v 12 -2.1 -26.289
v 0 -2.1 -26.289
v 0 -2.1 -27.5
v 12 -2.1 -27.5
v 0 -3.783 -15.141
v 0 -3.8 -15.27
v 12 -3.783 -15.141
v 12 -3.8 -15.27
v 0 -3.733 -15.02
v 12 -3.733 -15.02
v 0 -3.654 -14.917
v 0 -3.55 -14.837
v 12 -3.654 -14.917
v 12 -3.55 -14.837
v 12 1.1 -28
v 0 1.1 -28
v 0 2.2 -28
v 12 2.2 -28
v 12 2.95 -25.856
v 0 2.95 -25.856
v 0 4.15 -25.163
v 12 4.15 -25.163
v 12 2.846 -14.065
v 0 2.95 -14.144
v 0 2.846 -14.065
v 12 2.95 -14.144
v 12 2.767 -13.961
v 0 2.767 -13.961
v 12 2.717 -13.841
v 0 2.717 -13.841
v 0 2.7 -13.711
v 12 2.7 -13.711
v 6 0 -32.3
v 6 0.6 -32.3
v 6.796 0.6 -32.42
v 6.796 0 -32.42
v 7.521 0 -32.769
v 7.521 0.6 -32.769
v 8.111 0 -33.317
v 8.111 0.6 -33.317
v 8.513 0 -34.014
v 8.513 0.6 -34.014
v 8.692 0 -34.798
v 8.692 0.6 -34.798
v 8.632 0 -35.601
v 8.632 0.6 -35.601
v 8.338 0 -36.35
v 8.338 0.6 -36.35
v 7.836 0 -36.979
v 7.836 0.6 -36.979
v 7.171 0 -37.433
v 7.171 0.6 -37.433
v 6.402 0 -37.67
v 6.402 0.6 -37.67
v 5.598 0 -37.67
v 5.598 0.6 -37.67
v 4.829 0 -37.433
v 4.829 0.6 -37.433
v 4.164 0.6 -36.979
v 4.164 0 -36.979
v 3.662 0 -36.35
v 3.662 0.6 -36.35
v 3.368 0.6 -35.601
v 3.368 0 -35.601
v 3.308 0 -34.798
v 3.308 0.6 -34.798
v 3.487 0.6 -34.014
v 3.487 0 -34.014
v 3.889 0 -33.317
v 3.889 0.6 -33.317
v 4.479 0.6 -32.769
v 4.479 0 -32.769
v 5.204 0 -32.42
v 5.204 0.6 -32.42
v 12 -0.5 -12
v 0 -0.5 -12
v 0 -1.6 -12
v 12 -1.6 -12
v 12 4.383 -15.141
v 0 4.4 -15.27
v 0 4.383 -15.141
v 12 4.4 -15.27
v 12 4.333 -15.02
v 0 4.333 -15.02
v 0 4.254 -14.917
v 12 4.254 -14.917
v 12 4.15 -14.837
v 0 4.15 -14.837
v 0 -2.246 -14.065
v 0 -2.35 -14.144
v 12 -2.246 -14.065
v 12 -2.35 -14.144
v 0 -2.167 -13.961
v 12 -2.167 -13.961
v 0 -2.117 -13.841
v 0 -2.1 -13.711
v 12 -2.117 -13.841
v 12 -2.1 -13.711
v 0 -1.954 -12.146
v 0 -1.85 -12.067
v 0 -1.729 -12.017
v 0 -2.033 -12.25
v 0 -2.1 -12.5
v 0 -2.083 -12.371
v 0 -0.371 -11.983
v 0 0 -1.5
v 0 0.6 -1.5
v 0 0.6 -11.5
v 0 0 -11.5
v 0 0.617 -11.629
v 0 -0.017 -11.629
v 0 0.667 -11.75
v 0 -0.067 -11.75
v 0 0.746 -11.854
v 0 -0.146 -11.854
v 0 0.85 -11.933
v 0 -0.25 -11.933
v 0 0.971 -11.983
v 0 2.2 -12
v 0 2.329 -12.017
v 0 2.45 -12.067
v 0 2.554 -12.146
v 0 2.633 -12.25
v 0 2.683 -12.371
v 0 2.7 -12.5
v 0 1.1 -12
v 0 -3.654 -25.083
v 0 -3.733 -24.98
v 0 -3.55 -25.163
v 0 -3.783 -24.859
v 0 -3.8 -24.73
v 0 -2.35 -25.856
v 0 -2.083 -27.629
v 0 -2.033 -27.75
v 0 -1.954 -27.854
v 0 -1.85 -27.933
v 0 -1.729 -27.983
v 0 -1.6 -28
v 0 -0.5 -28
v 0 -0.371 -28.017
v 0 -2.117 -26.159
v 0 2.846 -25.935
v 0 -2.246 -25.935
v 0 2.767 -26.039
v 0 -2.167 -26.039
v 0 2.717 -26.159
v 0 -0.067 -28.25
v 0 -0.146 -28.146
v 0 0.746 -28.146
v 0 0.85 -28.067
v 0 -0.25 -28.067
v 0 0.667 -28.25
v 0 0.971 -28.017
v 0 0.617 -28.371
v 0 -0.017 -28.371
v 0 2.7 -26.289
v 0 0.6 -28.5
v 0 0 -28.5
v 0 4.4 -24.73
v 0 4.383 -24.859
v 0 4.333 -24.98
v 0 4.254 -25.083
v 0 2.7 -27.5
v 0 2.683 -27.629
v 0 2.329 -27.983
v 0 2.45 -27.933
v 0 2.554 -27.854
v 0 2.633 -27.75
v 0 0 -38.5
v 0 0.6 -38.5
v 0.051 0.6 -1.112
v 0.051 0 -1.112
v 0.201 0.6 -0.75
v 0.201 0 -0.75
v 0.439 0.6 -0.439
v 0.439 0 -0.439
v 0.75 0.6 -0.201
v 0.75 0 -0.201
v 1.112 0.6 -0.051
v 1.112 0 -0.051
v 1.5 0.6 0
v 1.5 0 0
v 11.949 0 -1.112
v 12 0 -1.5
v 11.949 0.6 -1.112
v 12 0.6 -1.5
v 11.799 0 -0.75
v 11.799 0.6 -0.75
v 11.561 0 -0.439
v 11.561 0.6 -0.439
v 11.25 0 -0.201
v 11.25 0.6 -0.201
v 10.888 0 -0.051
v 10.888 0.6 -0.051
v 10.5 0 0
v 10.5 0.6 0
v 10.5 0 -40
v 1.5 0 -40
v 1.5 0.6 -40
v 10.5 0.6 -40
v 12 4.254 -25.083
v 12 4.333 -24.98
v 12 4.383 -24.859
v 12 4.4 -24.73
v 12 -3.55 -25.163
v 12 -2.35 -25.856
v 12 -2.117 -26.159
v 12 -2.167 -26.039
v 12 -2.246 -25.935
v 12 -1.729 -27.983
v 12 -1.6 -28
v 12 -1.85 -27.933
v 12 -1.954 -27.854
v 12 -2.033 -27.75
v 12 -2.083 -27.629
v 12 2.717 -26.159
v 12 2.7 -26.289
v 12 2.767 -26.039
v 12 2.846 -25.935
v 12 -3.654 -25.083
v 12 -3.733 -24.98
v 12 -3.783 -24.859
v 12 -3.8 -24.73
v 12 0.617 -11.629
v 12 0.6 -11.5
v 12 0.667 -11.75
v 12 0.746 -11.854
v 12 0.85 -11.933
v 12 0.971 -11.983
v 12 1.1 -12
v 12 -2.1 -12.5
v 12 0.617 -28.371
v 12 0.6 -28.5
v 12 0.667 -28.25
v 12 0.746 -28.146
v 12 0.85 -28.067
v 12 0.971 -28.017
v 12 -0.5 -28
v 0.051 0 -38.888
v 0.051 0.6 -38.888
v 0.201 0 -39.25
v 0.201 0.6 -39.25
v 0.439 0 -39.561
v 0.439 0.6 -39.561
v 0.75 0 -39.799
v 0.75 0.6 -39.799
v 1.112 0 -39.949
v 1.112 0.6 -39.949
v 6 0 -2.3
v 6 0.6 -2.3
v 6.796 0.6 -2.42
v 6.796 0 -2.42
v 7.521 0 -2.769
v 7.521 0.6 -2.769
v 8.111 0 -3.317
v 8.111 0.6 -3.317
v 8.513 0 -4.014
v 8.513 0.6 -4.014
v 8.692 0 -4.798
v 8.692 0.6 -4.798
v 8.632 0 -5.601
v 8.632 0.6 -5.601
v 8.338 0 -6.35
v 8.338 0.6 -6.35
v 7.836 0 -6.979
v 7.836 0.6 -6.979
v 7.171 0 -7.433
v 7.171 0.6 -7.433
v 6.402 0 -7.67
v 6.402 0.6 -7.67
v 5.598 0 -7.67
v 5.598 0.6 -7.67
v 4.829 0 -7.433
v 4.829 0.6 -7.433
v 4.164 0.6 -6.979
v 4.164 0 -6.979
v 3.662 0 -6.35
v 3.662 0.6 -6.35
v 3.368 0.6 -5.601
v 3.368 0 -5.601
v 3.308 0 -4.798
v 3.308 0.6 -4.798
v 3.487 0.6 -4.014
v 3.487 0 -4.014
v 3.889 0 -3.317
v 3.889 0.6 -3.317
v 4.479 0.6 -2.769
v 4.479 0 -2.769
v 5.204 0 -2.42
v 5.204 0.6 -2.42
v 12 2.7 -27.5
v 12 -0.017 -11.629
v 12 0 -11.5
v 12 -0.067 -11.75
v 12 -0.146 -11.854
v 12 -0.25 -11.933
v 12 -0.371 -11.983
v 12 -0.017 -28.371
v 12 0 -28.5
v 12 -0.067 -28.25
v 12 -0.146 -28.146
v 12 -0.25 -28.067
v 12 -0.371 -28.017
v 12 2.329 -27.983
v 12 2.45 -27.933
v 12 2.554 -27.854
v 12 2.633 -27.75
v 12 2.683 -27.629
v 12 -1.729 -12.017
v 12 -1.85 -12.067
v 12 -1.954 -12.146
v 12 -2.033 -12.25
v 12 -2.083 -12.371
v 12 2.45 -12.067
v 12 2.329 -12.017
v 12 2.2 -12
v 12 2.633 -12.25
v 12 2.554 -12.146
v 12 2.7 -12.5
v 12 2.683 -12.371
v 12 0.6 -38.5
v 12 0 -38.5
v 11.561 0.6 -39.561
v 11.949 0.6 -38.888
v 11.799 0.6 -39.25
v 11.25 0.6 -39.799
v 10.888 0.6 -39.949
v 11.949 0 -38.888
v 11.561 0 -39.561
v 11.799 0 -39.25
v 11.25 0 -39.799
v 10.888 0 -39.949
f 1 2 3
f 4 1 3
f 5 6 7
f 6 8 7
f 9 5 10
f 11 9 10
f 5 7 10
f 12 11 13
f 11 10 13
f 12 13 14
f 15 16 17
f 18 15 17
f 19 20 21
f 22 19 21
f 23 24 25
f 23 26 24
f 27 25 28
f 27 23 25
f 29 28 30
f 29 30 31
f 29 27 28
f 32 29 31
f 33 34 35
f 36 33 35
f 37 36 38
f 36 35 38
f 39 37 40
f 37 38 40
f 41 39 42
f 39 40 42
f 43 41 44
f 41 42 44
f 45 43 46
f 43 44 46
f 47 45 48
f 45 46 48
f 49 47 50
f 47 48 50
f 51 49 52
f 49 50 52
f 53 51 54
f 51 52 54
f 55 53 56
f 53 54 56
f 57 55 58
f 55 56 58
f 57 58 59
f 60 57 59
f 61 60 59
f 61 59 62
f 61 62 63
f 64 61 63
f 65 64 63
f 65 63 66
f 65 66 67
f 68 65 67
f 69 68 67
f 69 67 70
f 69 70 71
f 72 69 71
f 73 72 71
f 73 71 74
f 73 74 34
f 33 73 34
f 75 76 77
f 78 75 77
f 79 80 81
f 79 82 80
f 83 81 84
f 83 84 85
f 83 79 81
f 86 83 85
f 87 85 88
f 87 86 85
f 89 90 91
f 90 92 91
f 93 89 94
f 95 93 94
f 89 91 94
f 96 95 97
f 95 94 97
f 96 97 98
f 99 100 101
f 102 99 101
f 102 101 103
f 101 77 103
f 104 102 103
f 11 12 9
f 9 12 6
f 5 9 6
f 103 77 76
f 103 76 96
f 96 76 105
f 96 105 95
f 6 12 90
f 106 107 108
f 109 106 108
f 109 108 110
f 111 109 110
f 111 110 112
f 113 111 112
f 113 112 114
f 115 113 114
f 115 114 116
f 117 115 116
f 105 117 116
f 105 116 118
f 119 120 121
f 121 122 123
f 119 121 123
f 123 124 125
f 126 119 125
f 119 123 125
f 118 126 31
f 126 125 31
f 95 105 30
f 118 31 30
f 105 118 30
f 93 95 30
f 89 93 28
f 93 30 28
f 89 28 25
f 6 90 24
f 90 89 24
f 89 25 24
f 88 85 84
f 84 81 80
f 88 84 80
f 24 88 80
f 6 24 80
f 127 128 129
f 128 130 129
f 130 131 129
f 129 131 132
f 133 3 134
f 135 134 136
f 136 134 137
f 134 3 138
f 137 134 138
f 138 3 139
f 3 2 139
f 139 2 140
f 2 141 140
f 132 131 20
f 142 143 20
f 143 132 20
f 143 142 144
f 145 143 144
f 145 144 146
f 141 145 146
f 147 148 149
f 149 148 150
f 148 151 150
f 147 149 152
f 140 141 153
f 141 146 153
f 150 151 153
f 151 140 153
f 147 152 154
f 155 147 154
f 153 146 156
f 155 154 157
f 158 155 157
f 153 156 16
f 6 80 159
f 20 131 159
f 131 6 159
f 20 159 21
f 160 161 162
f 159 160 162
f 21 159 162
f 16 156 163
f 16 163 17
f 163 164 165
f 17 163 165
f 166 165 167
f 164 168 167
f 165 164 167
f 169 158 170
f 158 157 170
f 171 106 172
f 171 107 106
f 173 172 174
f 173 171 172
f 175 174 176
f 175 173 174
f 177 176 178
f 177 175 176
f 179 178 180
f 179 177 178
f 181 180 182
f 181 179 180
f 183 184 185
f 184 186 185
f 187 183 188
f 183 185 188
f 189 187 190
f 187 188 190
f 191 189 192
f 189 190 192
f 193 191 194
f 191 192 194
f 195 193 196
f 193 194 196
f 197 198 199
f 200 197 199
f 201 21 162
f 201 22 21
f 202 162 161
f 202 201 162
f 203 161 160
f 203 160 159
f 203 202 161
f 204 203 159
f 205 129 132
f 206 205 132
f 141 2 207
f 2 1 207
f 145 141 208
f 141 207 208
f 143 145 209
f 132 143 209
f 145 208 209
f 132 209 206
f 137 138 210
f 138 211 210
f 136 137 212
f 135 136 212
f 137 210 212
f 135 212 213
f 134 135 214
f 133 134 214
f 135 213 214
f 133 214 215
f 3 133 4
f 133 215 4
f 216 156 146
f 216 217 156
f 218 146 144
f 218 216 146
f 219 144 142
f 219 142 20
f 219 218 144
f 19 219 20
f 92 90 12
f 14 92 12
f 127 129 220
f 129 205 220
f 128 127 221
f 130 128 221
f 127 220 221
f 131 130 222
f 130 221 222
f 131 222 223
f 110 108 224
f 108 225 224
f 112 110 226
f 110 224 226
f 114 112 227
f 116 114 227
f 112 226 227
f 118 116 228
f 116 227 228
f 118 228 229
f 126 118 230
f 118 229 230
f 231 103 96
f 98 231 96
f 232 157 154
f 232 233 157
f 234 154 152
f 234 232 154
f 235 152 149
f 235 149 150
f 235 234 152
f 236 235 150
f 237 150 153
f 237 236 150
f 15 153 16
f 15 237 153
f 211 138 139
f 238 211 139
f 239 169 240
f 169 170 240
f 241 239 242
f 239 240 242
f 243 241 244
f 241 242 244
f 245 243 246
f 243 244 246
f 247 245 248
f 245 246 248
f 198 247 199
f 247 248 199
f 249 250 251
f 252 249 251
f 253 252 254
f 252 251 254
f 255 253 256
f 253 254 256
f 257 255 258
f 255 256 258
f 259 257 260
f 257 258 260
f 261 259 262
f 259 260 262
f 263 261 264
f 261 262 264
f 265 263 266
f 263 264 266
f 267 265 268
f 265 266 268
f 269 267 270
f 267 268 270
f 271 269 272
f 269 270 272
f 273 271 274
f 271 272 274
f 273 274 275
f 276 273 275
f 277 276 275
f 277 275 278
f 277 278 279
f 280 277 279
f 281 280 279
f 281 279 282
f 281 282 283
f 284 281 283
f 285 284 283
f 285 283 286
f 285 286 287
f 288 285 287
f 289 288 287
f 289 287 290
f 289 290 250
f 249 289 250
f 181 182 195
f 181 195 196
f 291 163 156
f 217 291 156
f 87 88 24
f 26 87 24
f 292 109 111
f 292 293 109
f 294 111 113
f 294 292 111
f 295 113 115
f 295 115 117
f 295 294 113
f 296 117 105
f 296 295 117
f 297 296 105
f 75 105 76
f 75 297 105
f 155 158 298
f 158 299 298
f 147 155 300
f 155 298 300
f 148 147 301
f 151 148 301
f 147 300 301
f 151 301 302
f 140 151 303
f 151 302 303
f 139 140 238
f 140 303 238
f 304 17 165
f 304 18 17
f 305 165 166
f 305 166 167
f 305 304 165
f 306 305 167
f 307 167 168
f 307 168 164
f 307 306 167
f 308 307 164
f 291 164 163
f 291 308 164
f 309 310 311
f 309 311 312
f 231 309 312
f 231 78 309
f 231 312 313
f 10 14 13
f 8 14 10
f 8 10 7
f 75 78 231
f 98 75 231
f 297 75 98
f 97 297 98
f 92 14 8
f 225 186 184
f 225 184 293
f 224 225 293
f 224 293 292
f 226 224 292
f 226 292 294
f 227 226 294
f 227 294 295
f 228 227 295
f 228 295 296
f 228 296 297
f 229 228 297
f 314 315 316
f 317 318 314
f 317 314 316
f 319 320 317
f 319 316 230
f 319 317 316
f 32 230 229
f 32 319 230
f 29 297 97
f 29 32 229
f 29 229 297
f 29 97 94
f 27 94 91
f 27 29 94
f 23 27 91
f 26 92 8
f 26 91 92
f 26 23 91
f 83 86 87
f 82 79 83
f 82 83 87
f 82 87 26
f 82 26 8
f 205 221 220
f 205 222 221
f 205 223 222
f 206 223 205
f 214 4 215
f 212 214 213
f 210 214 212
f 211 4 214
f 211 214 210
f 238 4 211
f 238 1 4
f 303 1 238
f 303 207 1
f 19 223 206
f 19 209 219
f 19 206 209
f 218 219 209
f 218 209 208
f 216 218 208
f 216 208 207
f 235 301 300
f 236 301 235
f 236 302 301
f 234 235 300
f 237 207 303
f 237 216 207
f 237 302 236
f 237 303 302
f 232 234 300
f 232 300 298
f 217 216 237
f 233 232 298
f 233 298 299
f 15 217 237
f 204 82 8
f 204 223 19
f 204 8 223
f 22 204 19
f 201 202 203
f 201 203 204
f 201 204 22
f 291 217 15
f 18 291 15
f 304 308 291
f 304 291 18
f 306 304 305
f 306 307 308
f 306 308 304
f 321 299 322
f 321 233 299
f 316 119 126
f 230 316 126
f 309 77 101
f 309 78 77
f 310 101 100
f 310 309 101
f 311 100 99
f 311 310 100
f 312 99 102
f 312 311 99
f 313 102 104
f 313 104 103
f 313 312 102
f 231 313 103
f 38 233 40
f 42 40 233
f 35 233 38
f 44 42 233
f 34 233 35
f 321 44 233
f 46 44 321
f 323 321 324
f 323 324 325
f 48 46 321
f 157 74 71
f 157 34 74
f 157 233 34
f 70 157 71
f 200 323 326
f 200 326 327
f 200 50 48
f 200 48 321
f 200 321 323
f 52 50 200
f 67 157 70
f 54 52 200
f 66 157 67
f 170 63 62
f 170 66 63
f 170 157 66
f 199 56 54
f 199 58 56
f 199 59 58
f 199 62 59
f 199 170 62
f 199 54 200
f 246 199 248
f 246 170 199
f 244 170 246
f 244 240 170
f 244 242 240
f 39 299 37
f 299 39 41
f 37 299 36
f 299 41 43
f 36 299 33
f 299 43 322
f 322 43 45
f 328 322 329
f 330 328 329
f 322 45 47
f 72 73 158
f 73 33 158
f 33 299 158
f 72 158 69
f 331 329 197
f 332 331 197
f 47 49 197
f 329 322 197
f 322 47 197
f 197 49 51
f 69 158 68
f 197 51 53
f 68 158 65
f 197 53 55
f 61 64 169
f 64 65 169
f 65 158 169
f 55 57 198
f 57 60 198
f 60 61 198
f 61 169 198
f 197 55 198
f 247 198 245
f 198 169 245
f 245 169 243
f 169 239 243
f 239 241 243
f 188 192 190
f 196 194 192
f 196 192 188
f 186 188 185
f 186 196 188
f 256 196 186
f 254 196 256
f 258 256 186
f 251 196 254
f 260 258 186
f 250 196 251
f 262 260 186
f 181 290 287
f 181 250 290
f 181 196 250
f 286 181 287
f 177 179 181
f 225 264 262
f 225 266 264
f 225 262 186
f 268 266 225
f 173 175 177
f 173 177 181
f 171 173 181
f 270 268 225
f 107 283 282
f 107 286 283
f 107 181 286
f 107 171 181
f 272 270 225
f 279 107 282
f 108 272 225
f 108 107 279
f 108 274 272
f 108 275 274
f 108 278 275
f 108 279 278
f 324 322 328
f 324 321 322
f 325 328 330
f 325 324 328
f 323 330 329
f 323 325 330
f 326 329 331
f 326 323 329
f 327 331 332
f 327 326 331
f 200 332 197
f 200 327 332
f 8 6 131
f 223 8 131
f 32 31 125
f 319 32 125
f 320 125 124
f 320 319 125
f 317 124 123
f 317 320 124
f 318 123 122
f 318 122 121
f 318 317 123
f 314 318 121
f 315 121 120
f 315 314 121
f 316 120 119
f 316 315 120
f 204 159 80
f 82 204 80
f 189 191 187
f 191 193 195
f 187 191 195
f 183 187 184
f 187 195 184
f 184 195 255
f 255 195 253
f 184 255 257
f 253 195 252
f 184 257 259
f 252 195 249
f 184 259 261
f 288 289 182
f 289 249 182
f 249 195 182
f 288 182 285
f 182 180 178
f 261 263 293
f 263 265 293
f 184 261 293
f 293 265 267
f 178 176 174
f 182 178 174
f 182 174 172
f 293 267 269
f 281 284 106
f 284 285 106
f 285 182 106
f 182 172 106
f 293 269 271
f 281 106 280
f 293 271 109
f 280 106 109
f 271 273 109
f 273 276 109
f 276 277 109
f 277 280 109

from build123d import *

# Parameters (mm, degrees)
IZIM1_W                     = 40
IZIM1_H                     = 0.6
Y_KSEKLIK_EKSTR_ZYON1_DEPTH = 12
IZIM2_R                     = 2.7
KES_EKSTR_ZYON1_DEPTH       = 42.992380261
RADYUS1_R                   = 1.5
RADYUS2_R                   = 0.5


with BuildPart() as part:
    # Çizim1 → Yükseklik-Ekstrüzyon1 (new body)
    with BuildSketch(Plane(origin=(0, 0, 0), x_dir=(0, 0, -1), z_dir=(1, 0, 0))):
        Polygon((28, 0), (12, 0), (12, -2.1), (14, -2.1), (14.981495458, -3.8), (25.018504542, -3.8), (26, -2.1), (28, -2.1), align=None)
        Polygon((12, 2.7), (12, 0.6), (28, 0.6), (28, 2.7), (26, 2.7), (25.018504542, 4.4), (14.981495458, 4.4), (14, 2.7), align=None)
        with Locations((20, 0.3)):
            Rectangle(IZIM1_W, IZIM1_H)
    extrude(amount=Y_KSEKLIK_EKSTR_ZYON1_DEPTH)

    # Çizim2 → Kes-Ekstrüzyon1 (cut, through all)
    with BuildSketch(Plane(origin=(0, 0.6, 0), x_dir=(1, 0, 0), z_dir=(0, 1, 0))):
        with Locations(Location((6, 5, 0), (0, 0, 270))):
            Circle(IZIM2_R)
        with Locations(Location((6, 35, 0), (0, 0, 270))):
            Circle(IZIM2_R)
    extrude(amount=-KES_EKSTR_ZYON1_DEPTH, mode=Mode.SUBTRACT)

    # Radyus1
    radyus1_edges = [part.edges().sort_by_distance(p)[0] for p in [
        (12, 0.3, -40),
        (0, 0.3, 0),
        (0, 0.3, -40),
        (12, 0.3, 0),
    ]]
    fillet(radyus1_edges, radius=RADYUS1_R)

    # Radyus2
    radyus2_edges = [part.edges().sort_by_distance(p)[0] for p in [
        (6, -2.1, -28),
        (6, -2.1, -26),
        (6, -3.8, -25.018504542),
        (6, -3.8, -14.981495458),
        (6, -2.1, -14),
        (6, -2.1, -12),
        (6, 0, -12),
        (6, 0.6, -12),
        (6, 2.7, -12),
        (6, 2.7, -14),
        (6, 4.4, -14.981495458),
        (6, 4.4, -25.018504542),
        (6, 2.7, -26),
        (6, 2.7, -28),
        (6, 0.6, -28),
        (6, 0, -28),
    ]]
    fillet(radyus2_edges, radius=RADYUS2_R)


solid = part.part
